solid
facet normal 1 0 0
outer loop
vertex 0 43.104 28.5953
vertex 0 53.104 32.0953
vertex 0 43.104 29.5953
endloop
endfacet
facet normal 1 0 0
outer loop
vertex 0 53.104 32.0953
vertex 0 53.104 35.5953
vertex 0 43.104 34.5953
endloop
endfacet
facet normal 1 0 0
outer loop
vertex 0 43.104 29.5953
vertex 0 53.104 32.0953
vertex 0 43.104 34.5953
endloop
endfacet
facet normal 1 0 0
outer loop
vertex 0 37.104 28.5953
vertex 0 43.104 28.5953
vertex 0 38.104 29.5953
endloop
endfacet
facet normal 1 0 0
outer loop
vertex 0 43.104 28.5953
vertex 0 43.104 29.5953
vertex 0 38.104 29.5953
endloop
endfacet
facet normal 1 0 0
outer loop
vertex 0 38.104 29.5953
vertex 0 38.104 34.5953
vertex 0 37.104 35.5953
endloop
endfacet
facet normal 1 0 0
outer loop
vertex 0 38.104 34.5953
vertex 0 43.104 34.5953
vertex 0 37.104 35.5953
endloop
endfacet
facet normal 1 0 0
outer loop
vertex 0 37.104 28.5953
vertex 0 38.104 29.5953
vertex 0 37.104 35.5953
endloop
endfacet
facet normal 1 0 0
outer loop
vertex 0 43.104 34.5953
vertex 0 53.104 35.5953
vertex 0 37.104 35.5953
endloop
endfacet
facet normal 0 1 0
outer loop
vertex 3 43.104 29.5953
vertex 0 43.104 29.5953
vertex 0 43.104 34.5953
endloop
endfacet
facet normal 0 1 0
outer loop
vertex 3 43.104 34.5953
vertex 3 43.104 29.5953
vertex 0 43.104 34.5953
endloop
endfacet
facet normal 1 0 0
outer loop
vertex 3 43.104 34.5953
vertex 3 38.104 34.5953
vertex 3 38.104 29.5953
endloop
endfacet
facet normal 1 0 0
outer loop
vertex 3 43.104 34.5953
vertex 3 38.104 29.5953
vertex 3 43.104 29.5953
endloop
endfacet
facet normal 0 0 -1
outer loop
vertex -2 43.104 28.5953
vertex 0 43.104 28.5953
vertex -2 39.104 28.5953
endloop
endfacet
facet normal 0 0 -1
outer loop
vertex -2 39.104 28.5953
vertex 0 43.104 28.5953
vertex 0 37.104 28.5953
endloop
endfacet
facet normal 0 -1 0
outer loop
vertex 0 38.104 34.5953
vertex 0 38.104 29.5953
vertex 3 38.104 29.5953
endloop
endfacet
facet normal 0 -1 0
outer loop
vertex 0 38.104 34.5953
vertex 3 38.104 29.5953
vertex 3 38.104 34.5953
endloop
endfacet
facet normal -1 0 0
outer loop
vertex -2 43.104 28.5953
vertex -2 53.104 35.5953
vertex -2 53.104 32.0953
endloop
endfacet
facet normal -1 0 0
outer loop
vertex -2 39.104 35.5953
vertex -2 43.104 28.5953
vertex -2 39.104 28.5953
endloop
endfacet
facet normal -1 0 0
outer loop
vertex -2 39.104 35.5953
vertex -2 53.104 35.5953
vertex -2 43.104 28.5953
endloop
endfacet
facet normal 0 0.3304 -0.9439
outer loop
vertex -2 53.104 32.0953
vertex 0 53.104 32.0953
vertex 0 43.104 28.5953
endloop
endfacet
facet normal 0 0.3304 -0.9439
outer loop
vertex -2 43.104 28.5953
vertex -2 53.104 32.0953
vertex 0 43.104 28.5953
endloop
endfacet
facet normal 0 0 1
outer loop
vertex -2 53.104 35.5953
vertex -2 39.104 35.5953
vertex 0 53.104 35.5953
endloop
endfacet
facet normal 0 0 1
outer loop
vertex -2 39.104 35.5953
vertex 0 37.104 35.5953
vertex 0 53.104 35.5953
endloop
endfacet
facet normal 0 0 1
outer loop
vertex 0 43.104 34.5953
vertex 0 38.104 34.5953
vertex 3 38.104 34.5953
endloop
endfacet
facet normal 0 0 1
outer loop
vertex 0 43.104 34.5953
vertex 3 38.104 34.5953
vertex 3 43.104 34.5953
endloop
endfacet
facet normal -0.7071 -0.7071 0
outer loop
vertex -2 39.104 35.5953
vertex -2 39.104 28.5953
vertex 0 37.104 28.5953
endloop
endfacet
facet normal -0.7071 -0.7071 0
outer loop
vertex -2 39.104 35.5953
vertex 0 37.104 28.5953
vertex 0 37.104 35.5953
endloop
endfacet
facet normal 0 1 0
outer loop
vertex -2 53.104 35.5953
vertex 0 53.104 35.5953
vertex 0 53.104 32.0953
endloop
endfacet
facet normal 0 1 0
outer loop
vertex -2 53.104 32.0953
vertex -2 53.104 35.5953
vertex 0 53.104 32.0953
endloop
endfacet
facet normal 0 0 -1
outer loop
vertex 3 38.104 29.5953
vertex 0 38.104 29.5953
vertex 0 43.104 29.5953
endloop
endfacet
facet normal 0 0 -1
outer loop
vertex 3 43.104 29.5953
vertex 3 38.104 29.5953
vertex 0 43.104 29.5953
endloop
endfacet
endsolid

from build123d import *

# Parameters (mm, degrees)
F0_W     = 5
F0_H     = 5
F1_DEPTH = 3
F2_W     = 5
F2_H     = 5
F3_DEPTH = 2
F4_SIZE  = 1.99999


# Not quite as in the source:
# - a fillet or chamfer is up to 0.001 mm smaller than in the source, because OpenCascade refuses the exact size


with BuildPart() as f1:
    # F0 (on Right) → F1 (new body)
    with BuildSketch(Plane.YZ):
        with Locations((40.6040474772, 32.0952650385)):
            Rectangle(F0_W, F0_H)
    extrude(amount=F1_DEPTH)

    # F2 (on face) → F3 (join)
    with BuildSketch(Plane(origin=(0, 0, 0), x_dir=(0, -1, 0), z_dir=(-1, 0, 0))):
        with Locations((-40.6040474772, 32.0952650385)):
            Rectangle(F2_W, F2_H)
        Polygon((-37.1040474772, 28.5952650385), (-37.1040474772, 35.5952650385), (-43.1040474772, 35.5952650385), (-43.1040474772, 34.5952650385), (-38.1040474772, 34.5952650385), (-38.1040474772, 29.5952650385), (-43.1040474772, 29.5952650385), (-43.1040474772, 28.5952650385), align=None)
        Polygon((-43.1040474772, 34.5952650385), (-43.1040474772, 35.5952650385), (-51.1040474772, 32.7952650385), (-51.1040474772, 31.3952650385), (-43.1040474772, 28.5952650385), (-43.1040474772, 29.5952650385), align=None)
        Polygon((-51.1040474772, 32.7952650385), (-43.1040474772, 35.5952650385), (-51.1040474772, 35.5952650385), align=None)
        Polygon((-51.1040474772, 32.7952650385), (-51.1040474772, 35.5952650385), (-53.1040474772, 35.5952650385), (-53.1040474772, 32.0952650385), align=None)
        Polygon((-51.1040474772, 31.3952650385), (-51.1040474772, 32.7952650385), (-53.1040474772, 32.0952650385), align=None)
    extrude(amount=F3_DEPTH)

    # F4 (size 2 in the source; OpenCascade refuses exactly that, so slightly less here)
    f4_edges = [f1.edges().sort_by_distance(p)[0] for p in [
        (-2, 37.104047, 32.095265),
    ]]
    chamfer(f4_edges, length=F4_SIZE)


solid = f1.part
